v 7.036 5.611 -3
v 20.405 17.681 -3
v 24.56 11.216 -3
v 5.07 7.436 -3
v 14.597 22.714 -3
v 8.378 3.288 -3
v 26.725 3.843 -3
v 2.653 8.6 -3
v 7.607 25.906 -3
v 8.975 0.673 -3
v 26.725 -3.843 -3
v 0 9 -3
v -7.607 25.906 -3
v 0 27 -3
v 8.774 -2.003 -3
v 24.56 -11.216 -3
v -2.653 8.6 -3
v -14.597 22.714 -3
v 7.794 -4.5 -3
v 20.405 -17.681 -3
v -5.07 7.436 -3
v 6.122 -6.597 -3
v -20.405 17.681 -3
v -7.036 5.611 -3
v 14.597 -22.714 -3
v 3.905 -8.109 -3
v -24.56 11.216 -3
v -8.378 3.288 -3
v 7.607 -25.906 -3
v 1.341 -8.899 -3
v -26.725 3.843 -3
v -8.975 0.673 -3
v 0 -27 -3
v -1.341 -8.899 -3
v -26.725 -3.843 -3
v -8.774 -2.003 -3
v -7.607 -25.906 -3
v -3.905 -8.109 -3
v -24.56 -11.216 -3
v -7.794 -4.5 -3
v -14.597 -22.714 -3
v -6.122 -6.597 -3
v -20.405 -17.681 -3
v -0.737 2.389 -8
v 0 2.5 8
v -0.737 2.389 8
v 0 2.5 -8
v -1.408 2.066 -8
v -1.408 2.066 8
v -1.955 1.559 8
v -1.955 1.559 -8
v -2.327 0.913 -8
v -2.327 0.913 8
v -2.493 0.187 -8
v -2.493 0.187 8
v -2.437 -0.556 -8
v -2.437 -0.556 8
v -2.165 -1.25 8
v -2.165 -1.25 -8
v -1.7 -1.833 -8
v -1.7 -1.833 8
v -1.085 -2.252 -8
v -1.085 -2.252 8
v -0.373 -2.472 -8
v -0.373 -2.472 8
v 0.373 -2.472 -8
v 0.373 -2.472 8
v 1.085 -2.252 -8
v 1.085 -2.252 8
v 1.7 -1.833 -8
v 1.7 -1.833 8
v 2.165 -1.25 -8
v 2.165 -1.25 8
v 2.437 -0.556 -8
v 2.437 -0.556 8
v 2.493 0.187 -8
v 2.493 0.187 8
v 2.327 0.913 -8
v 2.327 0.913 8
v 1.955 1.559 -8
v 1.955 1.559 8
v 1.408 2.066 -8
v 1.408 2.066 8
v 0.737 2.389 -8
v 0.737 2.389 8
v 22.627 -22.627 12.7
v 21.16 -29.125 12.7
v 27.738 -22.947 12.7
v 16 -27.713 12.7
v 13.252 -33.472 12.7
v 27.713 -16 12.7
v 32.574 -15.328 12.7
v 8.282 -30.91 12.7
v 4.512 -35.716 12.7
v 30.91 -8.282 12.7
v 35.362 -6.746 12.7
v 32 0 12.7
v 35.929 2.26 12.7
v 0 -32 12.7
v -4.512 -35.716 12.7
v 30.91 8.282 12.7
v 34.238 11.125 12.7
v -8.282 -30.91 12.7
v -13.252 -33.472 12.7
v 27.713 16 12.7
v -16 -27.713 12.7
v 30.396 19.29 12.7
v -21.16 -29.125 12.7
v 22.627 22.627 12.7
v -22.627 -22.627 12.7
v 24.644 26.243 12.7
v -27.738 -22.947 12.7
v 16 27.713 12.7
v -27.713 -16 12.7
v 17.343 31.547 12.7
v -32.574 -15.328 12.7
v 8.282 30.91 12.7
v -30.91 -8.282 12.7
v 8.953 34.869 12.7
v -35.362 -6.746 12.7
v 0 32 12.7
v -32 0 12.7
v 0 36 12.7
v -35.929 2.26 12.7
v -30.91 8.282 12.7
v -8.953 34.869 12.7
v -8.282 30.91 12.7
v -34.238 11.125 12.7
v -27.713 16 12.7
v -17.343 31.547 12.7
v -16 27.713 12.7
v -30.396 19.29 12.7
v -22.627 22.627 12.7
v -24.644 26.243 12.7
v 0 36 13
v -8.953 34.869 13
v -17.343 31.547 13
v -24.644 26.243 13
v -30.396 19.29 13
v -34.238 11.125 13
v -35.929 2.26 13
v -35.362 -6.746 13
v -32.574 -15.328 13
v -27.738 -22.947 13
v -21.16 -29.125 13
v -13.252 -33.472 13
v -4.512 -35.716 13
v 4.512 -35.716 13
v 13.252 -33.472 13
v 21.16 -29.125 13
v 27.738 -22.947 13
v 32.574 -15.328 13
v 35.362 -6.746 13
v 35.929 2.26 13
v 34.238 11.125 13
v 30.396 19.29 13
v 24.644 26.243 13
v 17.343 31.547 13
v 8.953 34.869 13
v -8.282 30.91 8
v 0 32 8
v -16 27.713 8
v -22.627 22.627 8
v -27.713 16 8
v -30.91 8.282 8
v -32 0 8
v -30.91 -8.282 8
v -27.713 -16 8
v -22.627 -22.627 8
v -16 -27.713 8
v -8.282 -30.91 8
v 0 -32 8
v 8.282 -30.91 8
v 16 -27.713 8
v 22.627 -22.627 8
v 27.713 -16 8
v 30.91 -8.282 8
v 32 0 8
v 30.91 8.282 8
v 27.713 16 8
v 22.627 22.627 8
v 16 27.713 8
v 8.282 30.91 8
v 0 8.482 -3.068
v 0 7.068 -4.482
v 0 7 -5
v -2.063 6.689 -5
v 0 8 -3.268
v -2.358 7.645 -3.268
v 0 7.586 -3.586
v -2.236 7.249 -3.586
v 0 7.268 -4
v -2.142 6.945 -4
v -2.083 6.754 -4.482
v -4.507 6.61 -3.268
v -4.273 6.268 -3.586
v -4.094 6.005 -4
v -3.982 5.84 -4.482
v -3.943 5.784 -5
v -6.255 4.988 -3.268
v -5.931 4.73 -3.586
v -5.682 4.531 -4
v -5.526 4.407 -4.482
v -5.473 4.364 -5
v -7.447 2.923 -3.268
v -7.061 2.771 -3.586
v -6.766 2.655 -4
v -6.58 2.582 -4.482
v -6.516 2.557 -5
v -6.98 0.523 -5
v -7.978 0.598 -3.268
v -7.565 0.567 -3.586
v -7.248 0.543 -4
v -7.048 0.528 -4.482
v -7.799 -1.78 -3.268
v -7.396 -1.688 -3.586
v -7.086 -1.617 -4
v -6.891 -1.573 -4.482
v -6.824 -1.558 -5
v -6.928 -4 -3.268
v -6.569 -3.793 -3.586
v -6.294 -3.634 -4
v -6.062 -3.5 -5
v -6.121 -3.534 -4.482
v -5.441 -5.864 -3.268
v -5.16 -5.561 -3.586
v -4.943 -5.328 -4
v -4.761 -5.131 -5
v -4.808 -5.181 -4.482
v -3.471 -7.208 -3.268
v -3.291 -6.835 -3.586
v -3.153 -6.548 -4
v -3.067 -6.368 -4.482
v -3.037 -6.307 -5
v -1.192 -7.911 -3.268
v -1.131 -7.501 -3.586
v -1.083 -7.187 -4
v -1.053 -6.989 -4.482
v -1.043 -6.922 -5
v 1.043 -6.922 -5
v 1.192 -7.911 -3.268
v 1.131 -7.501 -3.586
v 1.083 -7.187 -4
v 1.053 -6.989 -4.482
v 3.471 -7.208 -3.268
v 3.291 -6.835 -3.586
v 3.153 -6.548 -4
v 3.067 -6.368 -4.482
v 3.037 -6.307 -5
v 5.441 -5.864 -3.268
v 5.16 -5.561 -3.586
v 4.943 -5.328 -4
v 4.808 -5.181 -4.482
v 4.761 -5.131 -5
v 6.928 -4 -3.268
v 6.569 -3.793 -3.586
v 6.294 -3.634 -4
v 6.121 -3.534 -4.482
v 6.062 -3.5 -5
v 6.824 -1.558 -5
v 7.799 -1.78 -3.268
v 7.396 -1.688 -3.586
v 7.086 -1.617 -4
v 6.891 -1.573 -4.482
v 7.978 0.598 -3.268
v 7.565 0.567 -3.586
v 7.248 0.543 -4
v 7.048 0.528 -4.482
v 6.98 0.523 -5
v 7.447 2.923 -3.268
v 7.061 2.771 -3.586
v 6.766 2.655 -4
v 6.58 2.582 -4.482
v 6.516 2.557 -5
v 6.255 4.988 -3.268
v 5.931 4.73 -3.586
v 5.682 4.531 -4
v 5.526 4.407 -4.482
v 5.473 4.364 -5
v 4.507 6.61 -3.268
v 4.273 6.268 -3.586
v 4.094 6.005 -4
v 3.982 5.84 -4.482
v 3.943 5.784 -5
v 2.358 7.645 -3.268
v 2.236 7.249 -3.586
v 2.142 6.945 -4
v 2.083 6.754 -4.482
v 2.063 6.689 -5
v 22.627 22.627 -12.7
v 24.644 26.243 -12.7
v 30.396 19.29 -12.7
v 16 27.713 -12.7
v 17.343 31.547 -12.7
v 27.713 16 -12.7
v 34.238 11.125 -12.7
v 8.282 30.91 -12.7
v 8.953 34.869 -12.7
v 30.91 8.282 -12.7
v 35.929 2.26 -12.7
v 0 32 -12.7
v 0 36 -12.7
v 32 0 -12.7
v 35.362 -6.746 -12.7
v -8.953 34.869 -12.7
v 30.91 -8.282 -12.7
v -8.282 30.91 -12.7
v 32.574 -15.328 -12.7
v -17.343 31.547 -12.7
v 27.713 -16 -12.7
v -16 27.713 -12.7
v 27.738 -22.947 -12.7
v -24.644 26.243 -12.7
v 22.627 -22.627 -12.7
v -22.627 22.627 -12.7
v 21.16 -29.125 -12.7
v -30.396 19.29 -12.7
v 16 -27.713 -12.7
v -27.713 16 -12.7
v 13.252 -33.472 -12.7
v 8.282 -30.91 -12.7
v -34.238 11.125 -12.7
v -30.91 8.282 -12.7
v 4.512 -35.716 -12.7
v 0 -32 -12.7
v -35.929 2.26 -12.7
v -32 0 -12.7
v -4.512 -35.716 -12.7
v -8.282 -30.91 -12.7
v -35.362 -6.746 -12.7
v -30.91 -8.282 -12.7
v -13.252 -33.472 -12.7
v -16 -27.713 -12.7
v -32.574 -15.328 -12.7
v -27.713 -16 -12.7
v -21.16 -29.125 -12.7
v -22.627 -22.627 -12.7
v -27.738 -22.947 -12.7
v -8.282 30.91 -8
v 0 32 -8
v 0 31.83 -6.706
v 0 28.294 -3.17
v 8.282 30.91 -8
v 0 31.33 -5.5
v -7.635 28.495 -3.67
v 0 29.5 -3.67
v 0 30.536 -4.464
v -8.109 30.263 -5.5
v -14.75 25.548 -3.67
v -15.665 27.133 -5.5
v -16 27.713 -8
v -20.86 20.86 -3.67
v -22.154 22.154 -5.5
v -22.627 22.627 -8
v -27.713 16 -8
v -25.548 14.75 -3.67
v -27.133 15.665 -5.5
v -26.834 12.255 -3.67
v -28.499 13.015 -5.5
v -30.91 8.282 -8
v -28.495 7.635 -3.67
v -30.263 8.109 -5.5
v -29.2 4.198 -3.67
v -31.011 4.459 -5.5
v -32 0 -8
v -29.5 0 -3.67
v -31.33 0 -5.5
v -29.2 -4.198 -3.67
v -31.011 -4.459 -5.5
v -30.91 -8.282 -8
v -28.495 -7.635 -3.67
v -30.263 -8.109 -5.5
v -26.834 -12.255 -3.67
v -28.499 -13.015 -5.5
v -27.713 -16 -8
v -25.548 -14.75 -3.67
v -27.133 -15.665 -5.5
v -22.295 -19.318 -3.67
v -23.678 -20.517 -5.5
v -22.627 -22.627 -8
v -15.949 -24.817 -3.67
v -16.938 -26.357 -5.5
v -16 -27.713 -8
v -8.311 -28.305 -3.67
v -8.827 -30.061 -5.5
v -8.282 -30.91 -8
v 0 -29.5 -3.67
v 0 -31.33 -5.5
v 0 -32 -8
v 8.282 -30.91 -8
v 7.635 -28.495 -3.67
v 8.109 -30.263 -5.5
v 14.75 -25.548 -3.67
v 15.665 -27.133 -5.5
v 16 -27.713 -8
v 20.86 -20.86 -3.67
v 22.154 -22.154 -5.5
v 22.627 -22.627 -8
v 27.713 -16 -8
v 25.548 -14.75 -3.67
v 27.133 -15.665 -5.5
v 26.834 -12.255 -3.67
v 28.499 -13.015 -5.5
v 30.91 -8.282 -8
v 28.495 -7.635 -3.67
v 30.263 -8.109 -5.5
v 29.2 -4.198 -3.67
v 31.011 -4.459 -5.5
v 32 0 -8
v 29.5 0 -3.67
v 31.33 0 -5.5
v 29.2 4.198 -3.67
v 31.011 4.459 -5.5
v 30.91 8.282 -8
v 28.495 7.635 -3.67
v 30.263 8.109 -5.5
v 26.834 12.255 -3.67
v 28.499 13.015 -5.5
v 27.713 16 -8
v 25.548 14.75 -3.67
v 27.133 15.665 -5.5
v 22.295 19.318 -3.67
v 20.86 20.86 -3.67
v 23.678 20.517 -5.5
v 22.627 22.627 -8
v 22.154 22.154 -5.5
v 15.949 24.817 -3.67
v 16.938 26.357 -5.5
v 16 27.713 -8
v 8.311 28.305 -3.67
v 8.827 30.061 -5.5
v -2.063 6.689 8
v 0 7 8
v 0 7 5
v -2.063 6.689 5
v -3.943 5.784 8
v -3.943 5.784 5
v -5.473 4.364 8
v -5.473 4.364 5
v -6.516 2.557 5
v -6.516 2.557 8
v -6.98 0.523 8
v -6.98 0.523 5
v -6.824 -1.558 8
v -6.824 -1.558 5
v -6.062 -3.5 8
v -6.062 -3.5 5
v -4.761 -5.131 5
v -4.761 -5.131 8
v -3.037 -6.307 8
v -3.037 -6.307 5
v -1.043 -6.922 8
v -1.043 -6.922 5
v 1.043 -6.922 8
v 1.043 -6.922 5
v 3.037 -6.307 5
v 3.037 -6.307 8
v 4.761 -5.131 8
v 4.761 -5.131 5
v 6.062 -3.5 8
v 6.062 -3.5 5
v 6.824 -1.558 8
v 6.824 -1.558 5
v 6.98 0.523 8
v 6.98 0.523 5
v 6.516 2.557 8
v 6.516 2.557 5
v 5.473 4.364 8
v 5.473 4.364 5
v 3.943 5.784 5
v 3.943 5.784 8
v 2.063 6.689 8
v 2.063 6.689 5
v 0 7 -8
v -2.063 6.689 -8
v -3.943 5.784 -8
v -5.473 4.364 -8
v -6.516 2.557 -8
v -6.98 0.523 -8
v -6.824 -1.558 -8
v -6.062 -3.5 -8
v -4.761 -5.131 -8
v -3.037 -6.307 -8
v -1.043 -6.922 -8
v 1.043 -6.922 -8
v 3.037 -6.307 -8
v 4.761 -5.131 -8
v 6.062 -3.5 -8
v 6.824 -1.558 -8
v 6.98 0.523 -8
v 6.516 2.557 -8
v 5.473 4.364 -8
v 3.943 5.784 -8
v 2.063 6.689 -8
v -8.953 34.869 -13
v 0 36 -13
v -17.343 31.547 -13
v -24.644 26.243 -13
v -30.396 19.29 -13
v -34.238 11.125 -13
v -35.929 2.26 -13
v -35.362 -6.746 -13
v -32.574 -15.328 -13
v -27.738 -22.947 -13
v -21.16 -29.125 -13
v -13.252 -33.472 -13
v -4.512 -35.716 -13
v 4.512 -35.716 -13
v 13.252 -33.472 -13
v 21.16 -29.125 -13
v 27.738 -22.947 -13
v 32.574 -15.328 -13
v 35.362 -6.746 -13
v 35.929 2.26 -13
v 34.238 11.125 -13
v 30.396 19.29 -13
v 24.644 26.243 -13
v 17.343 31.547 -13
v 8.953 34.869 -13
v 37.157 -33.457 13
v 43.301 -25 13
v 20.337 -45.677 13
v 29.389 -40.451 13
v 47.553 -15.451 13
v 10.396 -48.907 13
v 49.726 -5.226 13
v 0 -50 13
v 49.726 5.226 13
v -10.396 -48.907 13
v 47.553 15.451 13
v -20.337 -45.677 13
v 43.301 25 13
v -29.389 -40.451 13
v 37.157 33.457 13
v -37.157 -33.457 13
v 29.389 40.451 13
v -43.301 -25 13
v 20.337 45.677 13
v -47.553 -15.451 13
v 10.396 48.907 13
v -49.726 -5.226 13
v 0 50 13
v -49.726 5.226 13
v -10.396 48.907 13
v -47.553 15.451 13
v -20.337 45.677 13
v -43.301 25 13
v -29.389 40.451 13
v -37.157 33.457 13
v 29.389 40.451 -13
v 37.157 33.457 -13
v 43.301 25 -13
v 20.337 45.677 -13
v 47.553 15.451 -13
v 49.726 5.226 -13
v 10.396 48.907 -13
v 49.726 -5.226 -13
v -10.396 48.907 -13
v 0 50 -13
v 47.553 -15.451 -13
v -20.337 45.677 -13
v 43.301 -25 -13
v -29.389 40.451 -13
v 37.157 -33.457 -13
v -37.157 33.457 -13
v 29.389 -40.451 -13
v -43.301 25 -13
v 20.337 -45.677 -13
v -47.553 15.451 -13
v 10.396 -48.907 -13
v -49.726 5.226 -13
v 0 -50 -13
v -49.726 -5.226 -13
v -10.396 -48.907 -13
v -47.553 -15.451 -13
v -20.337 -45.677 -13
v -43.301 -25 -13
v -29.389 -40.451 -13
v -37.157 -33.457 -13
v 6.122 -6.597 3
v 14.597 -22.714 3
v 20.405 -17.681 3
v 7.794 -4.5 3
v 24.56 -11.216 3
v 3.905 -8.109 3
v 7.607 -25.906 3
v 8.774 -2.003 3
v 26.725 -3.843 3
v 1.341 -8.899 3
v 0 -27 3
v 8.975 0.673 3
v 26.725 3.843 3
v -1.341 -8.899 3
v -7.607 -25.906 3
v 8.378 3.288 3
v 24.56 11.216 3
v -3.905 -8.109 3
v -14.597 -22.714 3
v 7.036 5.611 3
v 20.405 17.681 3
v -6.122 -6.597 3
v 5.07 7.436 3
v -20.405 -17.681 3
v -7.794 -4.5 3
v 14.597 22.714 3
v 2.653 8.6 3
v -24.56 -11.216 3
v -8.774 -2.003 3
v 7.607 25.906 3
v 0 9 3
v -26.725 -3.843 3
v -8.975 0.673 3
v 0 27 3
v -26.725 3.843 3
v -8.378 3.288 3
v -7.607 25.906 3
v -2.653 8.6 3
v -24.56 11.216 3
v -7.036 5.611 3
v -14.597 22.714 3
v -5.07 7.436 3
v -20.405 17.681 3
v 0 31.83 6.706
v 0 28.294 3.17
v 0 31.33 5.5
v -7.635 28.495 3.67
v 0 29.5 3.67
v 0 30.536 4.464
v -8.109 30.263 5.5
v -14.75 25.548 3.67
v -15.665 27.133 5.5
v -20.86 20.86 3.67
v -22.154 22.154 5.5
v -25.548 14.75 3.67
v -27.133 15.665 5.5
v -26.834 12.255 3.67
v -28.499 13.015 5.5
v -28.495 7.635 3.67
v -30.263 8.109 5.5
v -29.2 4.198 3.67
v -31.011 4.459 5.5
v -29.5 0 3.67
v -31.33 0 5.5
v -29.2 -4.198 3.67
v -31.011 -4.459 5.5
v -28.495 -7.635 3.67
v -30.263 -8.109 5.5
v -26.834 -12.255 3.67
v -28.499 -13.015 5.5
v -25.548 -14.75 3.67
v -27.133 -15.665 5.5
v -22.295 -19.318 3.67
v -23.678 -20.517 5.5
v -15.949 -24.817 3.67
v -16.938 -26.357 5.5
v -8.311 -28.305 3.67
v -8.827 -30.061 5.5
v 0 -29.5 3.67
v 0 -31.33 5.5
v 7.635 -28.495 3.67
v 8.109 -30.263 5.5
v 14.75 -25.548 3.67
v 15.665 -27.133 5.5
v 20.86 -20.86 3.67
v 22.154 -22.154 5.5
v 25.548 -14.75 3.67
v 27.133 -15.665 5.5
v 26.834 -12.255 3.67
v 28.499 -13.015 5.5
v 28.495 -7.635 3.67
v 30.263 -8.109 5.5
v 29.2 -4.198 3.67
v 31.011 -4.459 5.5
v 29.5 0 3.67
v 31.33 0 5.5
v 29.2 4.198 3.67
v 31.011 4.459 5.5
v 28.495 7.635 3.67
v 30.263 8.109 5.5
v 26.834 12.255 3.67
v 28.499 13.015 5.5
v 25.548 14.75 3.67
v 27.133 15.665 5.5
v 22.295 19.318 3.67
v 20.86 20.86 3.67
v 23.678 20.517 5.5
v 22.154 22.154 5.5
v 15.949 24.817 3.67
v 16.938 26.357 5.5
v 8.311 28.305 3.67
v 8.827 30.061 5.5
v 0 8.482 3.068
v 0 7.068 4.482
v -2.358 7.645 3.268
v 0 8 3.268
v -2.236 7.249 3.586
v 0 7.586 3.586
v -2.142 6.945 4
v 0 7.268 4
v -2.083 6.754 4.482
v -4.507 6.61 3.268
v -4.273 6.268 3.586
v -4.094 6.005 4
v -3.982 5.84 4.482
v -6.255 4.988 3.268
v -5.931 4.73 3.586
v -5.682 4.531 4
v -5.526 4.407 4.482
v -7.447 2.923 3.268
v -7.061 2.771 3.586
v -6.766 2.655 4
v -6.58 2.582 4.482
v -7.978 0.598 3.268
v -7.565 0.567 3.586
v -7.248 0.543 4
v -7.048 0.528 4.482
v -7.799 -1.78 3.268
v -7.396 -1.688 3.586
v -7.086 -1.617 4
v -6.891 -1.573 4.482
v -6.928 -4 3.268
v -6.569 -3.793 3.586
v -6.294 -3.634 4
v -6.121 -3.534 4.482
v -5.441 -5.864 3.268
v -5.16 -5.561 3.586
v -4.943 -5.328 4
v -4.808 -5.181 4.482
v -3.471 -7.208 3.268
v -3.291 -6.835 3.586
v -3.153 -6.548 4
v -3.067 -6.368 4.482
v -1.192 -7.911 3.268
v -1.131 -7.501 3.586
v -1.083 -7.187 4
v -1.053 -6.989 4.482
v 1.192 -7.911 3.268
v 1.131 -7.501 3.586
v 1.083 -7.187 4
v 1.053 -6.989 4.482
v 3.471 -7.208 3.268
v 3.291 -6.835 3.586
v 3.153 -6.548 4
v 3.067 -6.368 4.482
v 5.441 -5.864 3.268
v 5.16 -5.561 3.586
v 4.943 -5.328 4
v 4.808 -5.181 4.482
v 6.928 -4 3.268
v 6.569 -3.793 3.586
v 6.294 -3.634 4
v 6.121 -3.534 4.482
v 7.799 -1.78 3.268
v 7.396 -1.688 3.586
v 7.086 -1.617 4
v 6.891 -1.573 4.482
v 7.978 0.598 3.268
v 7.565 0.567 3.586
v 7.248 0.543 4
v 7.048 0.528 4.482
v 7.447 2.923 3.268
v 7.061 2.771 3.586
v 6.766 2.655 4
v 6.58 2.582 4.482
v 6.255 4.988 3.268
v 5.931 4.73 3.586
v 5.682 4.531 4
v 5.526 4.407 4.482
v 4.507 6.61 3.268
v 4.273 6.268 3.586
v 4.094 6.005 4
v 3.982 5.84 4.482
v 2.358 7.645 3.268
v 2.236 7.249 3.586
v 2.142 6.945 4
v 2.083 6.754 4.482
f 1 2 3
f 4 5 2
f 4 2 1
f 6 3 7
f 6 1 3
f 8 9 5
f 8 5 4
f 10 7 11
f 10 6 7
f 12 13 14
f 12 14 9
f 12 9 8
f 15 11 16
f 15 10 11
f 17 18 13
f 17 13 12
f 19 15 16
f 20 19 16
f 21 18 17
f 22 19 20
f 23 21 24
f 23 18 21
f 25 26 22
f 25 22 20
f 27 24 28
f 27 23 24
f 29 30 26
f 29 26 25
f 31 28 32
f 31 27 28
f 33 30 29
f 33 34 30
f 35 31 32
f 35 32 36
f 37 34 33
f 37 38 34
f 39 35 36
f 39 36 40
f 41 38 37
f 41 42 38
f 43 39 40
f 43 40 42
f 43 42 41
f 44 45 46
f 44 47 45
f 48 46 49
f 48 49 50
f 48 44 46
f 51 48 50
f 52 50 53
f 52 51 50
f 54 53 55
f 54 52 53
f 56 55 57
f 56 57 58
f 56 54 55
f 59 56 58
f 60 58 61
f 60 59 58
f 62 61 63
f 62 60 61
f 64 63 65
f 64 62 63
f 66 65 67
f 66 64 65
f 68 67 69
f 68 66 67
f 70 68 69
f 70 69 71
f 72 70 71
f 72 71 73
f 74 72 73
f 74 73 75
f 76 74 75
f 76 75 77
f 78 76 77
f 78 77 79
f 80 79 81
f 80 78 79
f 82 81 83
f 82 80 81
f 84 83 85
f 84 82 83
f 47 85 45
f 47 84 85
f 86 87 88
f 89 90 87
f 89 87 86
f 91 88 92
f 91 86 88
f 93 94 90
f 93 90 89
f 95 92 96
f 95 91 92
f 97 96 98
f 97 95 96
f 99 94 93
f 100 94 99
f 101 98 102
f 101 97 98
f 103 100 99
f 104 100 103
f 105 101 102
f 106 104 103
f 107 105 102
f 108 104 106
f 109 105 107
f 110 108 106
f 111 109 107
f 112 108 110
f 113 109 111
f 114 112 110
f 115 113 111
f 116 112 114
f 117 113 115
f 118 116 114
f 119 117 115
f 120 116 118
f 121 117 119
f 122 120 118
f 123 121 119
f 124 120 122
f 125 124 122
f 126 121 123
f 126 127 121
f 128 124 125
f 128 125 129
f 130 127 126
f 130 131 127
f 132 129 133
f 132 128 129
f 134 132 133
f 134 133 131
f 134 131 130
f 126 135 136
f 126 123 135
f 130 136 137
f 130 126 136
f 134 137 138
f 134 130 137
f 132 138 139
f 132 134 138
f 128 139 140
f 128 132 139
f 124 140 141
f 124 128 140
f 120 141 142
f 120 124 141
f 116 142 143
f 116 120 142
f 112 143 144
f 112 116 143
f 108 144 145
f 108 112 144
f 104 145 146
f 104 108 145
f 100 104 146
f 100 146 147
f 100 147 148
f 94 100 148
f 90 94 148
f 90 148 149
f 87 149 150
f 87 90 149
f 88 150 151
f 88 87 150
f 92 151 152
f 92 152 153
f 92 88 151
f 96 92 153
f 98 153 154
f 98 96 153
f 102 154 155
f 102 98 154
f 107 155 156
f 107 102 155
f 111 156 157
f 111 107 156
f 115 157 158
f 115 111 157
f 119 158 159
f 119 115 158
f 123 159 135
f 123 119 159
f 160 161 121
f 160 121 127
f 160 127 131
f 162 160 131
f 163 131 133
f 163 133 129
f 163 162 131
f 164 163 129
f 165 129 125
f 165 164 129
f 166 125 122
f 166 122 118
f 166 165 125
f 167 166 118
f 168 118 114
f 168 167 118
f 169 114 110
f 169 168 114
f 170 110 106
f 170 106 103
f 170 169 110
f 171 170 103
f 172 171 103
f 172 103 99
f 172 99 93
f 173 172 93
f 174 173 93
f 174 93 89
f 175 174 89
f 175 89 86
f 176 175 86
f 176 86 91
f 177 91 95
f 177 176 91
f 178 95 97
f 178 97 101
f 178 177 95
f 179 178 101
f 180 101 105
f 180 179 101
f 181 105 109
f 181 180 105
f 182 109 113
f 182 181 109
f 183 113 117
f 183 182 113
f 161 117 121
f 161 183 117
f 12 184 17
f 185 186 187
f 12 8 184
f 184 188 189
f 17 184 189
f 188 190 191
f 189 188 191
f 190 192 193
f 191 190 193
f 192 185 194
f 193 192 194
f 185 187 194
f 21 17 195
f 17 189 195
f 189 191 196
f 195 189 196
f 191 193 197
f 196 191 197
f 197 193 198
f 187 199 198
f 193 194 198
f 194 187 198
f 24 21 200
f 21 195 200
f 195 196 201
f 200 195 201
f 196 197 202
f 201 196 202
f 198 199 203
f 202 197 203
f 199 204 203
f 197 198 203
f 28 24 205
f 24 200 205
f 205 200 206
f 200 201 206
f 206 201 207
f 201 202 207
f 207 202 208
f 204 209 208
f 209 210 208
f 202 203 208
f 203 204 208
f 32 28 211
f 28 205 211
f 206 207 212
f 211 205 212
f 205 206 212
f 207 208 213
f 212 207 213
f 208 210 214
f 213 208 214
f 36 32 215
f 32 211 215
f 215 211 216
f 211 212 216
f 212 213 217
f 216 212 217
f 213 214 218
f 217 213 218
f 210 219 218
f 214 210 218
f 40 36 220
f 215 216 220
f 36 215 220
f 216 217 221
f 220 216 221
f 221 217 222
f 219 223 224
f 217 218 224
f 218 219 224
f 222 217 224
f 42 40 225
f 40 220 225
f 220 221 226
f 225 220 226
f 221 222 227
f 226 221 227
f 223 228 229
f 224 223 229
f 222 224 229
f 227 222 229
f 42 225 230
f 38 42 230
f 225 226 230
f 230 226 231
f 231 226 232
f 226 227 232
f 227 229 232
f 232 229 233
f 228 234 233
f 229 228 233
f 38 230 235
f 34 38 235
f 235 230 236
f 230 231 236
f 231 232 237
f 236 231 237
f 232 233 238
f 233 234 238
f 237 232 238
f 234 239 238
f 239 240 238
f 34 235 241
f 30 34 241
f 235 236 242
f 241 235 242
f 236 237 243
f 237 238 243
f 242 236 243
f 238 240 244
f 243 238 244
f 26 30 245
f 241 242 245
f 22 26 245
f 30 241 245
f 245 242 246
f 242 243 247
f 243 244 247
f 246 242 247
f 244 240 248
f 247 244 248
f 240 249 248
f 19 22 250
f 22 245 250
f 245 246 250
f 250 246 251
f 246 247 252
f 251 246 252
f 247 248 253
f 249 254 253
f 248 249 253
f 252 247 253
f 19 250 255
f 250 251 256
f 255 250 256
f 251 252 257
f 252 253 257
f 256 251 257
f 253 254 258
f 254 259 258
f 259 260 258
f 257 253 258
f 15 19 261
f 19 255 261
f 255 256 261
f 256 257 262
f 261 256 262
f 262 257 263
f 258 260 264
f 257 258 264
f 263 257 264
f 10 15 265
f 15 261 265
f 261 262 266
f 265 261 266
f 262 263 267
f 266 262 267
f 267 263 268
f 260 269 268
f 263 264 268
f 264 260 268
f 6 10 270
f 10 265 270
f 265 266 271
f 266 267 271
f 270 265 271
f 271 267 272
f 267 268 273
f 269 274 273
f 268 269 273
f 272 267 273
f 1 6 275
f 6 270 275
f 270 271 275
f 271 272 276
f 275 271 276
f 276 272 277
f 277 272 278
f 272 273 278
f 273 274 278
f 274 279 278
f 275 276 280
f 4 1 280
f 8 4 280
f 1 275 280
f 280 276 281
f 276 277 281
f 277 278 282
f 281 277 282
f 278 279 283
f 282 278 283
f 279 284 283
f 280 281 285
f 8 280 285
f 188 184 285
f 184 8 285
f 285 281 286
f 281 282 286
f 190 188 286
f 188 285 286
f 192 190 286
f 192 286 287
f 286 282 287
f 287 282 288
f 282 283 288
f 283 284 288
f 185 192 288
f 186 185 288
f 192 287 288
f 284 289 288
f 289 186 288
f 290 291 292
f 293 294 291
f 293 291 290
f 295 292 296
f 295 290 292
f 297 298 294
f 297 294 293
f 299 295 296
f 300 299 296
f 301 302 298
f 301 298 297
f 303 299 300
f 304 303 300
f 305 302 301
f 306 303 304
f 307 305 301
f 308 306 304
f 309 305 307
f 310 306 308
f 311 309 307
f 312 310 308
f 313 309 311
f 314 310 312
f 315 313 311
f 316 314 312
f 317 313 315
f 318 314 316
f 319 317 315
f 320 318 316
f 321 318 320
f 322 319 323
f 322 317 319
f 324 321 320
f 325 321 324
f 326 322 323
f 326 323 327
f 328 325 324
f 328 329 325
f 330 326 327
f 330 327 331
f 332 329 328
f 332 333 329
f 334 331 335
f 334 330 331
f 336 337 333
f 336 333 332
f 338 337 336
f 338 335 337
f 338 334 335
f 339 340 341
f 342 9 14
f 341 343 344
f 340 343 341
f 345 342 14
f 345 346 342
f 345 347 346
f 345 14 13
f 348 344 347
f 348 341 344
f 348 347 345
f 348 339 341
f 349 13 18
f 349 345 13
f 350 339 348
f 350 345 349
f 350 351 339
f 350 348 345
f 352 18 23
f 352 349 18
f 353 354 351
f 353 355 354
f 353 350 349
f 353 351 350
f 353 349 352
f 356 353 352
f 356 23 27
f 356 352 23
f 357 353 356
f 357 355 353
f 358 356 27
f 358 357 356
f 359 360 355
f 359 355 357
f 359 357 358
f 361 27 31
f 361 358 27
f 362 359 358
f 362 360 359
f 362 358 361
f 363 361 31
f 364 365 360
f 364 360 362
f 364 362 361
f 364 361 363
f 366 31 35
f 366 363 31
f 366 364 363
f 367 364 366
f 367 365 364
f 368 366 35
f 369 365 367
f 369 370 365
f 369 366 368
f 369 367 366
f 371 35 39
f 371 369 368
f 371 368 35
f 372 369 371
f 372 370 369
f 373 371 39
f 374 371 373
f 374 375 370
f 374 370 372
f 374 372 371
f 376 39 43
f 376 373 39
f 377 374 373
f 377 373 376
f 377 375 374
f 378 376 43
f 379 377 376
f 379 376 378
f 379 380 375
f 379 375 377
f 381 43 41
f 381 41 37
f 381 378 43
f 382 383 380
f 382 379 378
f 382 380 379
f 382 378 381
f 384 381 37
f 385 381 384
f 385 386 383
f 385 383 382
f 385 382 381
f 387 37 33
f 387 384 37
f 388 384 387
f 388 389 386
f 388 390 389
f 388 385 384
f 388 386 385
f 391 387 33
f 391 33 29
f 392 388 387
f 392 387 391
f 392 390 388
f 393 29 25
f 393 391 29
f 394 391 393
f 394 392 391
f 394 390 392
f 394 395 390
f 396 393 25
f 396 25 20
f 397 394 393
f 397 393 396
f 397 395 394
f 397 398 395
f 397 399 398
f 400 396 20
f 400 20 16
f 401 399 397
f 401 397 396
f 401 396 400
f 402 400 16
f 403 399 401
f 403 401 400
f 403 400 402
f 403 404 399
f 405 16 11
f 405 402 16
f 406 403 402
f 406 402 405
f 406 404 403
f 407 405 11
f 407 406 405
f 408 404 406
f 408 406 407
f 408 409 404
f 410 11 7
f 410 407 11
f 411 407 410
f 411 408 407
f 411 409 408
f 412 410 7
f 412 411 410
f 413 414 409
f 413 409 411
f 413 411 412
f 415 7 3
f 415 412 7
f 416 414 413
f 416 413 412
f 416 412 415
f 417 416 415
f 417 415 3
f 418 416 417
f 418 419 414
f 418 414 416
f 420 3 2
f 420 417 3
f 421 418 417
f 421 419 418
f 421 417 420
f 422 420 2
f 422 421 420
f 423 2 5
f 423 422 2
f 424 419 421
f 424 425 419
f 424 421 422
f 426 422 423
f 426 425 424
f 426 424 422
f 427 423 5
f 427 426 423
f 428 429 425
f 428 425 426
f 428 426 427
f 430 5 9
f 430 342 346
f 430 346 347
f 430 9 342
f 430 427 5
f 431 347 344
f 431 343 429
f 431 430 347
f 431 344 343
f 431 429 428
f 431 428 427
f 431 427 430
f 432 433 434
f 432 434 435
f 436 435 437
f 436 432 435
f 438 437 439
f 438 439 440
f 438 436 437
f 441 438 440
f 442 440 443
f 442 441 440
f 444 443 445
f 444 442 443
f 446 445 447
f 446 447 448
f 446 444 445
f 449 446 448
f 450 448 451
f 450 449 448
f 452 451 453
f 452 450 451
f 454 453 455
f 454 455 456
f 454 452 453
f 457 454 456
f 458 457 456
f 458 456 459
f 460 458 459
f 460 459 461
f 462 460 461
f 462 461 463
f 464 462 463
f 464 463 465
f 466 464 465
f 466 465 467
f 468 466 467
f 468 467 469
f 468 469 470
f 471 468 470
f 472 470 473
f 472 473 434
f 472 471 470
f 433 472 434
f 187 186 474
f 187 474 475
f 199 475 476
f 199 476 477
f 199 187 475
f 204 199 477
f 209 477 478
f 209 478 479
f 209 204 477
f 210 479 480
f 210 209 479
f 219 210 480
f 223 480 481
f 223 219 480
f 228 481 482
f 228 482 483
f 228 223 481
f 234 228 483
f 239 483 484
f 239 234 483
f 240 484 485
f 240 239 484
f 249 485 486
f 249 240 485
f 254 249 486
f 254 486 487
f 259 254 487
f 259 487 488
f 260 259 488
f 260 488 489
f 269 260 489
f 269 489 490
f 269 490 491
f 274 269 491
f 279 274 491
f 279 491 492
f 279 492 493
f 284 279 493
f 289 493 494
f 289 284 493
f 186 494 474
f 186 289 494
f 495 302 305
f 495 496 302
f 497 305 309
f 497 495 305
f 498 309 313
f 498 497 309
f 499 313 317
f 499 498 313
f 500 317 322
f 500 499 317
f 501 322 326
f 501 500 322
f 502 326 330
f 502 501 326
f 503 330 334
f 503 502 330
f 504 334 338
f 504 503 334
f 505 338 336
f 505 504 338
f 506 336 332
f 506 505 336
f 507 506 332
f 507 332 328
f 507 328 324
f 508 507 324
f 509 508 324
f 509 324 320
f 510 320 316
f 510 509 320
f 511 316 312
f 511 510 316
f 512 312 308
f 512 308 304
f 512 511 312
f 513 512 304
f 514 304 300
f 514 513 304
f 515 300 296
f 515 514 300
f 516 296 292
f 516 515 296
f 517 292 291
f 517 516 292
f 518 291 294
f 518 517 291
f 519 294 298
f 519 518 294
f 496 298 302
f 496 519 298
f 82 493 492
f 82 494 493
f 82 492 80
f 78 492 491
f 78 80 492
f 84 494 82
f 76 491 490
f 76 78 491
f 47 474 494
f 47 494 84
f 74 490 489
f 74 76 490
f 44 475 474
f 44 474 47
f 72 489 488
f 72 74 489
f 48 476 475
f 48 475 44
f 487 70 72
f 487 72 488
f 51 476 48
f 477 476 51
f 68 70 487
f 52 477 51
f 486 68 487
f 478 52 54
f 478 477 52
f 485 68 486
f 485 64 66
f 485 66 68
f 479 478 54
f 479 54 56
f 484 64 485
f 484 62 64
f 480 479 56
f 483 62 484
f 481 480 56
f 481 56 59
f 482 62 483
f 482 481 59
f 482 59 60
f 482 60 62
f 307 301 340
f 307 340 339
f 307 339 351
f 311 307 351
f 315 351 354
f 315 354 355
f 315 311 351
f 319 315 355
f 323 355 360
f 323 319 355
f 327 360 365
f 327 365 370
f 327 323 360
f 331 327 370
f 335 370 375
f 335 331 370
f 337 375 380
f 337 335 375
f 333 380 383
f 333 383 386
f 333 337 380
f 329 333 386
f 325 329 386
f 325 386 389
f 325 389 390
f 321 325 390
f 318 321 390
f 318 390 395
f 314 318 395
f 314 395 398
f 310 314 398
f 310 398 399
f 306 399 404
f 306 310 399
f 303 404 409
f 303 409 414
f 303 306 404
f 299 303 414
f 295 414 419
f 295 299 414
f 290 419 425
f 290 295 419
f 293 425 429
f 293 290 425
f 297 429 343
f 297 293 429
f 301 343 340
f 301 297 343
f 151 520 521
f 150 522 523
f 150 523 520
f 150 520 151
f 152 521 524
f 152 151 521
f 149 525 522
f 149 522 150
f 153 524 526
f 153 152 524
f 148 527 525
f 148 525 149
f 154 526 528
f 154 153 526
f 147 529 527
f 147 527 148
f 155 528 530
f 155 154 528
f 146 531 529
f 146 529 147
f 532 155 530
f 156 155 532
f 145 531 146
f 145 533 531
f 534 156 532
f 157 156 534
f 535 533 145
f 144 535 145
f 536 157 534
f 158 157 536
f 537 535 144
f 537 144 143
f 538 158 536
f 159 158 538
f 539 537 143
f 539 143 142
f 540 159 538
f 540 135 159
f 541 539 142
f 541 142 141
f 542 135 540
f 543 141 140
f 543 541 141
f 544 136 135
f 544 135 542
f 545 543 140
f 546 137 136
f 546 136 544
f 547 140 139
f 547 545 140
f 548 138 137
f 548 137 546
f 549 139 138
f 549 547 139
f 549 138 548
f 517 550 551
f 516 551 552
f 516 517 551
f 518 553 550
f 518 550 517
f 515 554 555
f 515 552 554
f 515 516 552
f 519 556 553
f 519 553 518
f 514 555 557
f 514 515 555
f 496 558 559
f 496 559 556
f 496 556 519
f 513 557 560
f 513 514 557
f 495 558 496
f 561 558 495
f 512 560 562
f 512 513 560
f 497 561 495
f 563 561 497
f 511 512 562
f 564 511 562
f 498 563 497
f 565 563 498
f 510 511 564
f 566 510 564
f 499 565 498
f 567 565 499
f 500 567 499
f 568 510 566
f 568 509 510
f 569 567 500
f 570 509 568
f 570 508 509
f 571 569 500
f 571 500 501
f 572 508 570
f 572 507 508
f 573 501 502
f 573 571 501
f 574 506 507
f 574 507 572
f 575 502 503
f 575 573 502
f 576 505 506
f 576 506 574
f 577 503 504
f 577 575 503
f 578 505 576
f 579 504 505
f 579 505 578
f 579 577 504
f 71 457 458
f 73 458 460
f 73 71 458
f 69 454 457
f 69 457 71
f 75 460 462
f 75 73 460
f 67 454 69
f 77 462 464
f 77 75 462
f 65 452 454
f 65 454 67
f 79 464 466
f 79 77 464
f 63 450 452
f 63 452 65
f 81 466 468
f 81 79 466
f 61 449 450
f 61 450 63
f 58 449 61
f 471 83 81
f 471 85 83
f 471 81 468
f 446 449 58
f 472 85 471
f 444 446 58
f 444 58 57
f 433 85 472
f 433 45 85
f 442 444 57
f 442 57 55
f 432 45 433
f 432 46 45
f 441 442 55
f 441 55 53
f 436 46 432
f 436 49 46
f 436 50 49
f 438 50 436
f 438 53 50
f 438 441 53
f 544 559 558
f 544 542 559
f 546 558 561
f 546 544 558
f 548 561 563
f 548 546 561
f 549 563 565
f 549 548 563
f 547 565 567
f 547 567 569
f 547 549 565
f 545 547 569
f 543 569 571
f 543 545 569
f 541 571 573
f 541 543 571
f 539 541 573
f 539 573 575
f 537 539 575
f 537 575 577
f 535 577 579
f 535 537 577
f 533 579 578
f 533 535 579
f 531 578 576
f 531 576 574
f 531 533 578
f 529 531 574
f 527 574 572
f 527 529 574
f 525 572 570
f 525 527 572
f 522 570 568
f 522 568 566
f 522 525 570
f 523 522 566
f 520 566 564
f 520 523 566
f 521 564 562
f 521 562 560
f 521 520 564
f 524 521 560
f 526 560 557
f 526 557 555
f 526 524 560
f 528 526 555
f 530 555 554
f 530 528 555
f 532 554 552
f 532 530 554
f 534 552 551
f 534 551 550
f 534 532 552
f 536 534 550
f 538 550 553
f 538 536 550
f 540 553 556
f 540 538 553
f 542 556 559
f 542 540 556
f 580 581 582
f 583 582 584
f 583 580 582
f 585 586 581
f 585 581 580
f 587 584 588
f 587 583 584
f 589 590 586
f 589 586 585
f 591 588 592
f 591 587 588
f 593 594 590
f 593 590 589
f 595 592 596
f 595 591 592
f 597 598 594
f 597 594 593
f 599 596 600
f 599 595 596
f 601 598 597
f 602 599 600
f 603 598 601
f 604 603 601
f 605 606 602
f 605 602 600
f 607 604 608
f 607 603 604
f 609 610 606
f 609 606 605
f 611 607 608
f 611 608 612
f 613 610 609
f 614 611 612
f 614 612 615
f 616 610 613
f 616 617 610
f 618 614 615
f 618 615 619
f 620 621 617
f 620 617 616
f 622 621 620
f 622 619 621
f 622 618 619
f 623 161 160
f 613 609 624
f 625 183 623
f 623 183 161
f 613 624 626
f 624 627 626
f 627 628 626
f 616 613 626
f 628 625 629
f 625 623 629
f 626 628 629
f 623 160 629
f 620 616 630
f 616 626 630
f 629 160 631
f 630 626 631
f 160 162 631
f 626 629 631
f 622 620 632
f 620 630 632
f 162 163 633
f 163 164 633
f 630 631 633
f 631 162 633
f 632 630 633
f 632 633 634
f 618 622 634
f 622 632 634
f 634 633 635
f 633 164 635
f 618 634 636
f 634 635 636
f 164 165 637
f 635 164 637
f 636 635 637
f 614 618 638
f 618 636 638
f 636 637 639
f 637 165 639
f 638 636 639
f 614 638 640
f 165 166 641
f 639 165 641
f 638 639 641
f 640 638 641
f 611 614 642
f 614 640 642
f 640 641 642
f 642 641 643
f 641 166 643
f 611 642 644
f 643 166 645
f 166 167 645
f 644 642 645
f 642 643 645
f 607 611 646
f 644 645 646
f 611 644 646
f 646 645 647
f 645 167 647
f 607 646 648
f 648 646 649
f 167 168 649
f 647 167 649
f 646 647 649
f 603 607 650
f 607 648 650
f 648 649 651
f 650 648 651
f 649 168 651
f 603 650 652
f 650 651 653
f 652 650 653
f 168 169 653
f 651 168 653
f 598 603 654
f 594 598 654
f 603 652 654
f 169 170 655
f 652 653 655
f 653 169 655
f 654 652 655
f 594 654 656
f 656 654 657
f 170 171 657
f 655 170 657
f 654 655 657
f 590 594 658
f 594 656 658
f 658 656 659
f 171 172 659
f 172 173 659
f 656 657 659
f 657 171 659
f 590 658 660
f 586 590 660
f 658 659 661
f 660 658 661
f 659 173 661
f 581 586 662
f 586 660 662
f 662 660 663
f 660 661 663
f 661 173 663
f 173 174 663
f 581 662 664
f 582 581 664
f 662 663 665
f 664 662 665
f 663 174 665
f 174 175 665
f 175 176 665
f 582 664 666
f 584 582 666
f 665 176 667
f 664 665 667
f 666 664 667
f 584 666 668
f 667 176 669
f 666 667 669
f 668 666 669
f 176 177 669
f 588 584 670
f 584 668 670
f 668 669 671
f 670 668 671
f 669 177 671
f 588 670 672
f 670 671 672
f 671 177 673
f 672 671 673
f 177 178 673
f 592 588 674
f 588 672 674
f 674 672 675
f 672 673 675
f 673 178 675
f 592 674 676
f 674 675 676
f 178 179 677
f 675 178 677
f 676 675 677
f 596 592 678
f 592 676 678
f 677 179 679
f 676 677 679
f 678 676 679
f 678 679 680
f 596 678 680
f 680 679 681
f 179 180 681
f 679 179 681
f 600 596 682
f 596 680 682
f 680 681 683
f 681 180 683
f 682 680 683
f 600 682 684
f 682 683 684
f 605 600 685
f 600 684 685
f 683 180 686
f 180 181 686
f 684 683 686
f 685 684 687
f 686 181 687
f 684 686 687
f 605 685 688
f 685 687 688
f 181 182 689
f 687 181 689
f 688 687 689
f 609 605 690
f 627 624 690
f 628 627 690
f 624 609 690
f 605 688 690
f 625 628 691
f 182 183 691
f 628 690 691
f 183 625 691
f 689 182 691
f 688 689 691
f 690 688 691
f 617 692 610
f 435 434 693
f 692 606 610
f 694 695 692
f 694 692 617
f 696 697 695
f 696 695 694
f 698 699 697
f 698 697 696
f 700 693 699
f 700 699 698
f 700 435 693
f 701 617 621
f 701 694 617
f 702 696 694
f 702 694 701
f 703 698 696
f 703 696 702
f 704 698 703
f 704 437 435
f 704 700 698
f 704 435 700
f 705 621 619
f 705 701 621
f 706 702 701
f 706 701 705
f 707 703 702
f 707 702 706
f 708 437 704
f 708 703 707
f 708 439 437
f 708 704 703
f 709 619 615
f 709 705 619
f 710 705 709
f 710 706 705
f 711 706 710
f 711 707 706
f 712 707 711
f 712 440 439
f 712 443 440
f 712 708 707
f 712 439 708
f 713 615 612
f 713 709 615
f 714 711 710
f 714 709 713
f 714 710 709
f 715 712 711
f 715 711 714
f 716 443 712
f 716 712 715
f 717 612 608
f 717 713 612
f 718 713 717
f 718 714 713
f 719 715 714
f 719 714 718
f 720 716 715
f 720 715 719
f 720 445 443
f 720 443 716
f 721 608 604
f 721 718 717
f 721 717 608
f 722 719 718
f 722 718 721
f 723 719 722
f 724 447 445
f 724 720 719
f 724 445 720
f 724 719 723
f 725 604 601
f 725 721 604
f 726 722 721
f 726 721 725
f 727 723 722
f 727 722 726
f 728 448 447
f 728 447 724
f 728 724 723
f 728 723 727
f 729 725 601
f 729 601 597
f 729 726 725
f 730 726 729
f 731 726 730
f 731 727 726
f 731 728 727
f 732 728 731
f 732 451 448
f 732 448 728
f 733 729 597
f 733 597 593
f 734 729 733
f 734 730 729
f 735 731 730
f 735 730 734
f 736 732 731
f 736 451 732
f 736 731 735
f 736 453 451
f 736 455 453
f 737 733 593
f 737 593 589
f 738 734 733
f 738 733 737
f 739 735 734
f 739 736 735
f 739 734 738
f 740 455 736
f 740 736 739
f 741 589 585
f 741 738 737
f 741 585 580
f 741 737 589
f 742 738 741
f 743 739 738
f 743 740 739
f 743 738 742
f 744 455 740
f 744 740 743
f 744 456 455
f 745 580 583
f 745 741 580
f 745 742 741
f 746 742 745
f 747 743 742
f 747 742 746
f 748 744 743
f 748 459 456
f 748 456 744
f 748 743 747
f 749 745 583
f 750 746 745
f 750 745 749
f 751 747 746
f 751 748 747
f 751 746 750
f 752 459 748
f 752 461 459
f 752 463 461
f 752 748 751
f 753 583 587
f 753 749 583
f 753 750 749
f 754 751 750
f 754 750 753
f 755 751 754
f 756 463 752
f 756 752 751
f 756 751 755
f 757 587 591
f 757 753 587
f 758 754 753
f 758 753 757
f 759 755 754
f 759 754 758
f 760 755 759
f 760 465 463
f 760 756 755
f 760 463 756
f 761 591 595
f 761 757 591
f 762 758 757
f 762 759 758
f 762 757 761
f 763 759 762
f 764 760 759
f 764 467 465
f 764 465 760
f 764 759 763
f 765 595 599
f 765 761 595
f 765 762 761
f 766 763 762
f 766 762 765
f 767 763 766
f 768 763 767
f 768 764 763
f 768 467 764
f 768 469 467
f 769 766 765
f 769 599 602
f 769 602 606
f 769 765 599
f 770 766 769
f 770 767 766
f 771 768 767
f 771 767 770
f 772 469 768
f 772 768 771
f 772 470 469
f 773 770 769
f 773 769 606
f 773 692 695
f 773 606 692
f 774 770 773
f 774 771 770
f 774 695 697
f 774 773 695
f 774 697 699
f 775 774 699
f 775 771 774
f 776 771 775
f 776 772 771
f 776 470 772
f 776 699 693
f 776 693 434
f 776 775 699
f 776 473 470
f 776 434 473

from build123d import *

# Parameters (mm, degrees)
FILLET1_R = 5
FILLET2_R = 2
FILLET3_R = 5
FILLET4_R = 2


with BuildPart() as part:
    # Sketch2 → Revolve2 (revolve)
    with BuildSketch(Plane(origin=(0, 0, 0), x_dir=(0, 0, -1), z_dir=(1, 0, 0))):
        Polygon((-8, 2.5), (8, 2.5), (8, 7), (3, 7), (3, 32), (12.7, 32), (12.7, 36), (13, 36), (13, 50), (-13, 50), (-13, 36), (-12.7, 36), (-12.7, 32), (-3, 32), (-3, 7), (-8, 7), align=None)
    revolve(axis=Axis((0, 0, -5.520153215), (0, 0, 1)))

    # Fillet1
    fillet1_edges = [part.edges().sort_by_distance(p)[0] for p in [
        (0, -32, -3),
    ]]
    fillet(fillet1_edges, radius=FILLET1_R)

    # Fillet2
    fillet2_edges = [part.edges().sort_by_distance(p)[0] for p in [
        (0, -7, -3),
    ]]
    fillet(fillet2_edges, radius=FILLET2_R)

    # Fillet3
    fillet3_edges = [part.edges().sort_by_distance(p)[0] for p in [
        (0, -32, 3),
    ]]
    fillet(fillet3_edges, radius=FILLET3_R)

    # Fillet4
    fillet4_edges = [part.edges().sort_by_distance(p)[0] for p in [
        (0, -7, 3),
    ]]
    fillet(fillet4_edges, radius=FILLET4_R)


solid = part.part
